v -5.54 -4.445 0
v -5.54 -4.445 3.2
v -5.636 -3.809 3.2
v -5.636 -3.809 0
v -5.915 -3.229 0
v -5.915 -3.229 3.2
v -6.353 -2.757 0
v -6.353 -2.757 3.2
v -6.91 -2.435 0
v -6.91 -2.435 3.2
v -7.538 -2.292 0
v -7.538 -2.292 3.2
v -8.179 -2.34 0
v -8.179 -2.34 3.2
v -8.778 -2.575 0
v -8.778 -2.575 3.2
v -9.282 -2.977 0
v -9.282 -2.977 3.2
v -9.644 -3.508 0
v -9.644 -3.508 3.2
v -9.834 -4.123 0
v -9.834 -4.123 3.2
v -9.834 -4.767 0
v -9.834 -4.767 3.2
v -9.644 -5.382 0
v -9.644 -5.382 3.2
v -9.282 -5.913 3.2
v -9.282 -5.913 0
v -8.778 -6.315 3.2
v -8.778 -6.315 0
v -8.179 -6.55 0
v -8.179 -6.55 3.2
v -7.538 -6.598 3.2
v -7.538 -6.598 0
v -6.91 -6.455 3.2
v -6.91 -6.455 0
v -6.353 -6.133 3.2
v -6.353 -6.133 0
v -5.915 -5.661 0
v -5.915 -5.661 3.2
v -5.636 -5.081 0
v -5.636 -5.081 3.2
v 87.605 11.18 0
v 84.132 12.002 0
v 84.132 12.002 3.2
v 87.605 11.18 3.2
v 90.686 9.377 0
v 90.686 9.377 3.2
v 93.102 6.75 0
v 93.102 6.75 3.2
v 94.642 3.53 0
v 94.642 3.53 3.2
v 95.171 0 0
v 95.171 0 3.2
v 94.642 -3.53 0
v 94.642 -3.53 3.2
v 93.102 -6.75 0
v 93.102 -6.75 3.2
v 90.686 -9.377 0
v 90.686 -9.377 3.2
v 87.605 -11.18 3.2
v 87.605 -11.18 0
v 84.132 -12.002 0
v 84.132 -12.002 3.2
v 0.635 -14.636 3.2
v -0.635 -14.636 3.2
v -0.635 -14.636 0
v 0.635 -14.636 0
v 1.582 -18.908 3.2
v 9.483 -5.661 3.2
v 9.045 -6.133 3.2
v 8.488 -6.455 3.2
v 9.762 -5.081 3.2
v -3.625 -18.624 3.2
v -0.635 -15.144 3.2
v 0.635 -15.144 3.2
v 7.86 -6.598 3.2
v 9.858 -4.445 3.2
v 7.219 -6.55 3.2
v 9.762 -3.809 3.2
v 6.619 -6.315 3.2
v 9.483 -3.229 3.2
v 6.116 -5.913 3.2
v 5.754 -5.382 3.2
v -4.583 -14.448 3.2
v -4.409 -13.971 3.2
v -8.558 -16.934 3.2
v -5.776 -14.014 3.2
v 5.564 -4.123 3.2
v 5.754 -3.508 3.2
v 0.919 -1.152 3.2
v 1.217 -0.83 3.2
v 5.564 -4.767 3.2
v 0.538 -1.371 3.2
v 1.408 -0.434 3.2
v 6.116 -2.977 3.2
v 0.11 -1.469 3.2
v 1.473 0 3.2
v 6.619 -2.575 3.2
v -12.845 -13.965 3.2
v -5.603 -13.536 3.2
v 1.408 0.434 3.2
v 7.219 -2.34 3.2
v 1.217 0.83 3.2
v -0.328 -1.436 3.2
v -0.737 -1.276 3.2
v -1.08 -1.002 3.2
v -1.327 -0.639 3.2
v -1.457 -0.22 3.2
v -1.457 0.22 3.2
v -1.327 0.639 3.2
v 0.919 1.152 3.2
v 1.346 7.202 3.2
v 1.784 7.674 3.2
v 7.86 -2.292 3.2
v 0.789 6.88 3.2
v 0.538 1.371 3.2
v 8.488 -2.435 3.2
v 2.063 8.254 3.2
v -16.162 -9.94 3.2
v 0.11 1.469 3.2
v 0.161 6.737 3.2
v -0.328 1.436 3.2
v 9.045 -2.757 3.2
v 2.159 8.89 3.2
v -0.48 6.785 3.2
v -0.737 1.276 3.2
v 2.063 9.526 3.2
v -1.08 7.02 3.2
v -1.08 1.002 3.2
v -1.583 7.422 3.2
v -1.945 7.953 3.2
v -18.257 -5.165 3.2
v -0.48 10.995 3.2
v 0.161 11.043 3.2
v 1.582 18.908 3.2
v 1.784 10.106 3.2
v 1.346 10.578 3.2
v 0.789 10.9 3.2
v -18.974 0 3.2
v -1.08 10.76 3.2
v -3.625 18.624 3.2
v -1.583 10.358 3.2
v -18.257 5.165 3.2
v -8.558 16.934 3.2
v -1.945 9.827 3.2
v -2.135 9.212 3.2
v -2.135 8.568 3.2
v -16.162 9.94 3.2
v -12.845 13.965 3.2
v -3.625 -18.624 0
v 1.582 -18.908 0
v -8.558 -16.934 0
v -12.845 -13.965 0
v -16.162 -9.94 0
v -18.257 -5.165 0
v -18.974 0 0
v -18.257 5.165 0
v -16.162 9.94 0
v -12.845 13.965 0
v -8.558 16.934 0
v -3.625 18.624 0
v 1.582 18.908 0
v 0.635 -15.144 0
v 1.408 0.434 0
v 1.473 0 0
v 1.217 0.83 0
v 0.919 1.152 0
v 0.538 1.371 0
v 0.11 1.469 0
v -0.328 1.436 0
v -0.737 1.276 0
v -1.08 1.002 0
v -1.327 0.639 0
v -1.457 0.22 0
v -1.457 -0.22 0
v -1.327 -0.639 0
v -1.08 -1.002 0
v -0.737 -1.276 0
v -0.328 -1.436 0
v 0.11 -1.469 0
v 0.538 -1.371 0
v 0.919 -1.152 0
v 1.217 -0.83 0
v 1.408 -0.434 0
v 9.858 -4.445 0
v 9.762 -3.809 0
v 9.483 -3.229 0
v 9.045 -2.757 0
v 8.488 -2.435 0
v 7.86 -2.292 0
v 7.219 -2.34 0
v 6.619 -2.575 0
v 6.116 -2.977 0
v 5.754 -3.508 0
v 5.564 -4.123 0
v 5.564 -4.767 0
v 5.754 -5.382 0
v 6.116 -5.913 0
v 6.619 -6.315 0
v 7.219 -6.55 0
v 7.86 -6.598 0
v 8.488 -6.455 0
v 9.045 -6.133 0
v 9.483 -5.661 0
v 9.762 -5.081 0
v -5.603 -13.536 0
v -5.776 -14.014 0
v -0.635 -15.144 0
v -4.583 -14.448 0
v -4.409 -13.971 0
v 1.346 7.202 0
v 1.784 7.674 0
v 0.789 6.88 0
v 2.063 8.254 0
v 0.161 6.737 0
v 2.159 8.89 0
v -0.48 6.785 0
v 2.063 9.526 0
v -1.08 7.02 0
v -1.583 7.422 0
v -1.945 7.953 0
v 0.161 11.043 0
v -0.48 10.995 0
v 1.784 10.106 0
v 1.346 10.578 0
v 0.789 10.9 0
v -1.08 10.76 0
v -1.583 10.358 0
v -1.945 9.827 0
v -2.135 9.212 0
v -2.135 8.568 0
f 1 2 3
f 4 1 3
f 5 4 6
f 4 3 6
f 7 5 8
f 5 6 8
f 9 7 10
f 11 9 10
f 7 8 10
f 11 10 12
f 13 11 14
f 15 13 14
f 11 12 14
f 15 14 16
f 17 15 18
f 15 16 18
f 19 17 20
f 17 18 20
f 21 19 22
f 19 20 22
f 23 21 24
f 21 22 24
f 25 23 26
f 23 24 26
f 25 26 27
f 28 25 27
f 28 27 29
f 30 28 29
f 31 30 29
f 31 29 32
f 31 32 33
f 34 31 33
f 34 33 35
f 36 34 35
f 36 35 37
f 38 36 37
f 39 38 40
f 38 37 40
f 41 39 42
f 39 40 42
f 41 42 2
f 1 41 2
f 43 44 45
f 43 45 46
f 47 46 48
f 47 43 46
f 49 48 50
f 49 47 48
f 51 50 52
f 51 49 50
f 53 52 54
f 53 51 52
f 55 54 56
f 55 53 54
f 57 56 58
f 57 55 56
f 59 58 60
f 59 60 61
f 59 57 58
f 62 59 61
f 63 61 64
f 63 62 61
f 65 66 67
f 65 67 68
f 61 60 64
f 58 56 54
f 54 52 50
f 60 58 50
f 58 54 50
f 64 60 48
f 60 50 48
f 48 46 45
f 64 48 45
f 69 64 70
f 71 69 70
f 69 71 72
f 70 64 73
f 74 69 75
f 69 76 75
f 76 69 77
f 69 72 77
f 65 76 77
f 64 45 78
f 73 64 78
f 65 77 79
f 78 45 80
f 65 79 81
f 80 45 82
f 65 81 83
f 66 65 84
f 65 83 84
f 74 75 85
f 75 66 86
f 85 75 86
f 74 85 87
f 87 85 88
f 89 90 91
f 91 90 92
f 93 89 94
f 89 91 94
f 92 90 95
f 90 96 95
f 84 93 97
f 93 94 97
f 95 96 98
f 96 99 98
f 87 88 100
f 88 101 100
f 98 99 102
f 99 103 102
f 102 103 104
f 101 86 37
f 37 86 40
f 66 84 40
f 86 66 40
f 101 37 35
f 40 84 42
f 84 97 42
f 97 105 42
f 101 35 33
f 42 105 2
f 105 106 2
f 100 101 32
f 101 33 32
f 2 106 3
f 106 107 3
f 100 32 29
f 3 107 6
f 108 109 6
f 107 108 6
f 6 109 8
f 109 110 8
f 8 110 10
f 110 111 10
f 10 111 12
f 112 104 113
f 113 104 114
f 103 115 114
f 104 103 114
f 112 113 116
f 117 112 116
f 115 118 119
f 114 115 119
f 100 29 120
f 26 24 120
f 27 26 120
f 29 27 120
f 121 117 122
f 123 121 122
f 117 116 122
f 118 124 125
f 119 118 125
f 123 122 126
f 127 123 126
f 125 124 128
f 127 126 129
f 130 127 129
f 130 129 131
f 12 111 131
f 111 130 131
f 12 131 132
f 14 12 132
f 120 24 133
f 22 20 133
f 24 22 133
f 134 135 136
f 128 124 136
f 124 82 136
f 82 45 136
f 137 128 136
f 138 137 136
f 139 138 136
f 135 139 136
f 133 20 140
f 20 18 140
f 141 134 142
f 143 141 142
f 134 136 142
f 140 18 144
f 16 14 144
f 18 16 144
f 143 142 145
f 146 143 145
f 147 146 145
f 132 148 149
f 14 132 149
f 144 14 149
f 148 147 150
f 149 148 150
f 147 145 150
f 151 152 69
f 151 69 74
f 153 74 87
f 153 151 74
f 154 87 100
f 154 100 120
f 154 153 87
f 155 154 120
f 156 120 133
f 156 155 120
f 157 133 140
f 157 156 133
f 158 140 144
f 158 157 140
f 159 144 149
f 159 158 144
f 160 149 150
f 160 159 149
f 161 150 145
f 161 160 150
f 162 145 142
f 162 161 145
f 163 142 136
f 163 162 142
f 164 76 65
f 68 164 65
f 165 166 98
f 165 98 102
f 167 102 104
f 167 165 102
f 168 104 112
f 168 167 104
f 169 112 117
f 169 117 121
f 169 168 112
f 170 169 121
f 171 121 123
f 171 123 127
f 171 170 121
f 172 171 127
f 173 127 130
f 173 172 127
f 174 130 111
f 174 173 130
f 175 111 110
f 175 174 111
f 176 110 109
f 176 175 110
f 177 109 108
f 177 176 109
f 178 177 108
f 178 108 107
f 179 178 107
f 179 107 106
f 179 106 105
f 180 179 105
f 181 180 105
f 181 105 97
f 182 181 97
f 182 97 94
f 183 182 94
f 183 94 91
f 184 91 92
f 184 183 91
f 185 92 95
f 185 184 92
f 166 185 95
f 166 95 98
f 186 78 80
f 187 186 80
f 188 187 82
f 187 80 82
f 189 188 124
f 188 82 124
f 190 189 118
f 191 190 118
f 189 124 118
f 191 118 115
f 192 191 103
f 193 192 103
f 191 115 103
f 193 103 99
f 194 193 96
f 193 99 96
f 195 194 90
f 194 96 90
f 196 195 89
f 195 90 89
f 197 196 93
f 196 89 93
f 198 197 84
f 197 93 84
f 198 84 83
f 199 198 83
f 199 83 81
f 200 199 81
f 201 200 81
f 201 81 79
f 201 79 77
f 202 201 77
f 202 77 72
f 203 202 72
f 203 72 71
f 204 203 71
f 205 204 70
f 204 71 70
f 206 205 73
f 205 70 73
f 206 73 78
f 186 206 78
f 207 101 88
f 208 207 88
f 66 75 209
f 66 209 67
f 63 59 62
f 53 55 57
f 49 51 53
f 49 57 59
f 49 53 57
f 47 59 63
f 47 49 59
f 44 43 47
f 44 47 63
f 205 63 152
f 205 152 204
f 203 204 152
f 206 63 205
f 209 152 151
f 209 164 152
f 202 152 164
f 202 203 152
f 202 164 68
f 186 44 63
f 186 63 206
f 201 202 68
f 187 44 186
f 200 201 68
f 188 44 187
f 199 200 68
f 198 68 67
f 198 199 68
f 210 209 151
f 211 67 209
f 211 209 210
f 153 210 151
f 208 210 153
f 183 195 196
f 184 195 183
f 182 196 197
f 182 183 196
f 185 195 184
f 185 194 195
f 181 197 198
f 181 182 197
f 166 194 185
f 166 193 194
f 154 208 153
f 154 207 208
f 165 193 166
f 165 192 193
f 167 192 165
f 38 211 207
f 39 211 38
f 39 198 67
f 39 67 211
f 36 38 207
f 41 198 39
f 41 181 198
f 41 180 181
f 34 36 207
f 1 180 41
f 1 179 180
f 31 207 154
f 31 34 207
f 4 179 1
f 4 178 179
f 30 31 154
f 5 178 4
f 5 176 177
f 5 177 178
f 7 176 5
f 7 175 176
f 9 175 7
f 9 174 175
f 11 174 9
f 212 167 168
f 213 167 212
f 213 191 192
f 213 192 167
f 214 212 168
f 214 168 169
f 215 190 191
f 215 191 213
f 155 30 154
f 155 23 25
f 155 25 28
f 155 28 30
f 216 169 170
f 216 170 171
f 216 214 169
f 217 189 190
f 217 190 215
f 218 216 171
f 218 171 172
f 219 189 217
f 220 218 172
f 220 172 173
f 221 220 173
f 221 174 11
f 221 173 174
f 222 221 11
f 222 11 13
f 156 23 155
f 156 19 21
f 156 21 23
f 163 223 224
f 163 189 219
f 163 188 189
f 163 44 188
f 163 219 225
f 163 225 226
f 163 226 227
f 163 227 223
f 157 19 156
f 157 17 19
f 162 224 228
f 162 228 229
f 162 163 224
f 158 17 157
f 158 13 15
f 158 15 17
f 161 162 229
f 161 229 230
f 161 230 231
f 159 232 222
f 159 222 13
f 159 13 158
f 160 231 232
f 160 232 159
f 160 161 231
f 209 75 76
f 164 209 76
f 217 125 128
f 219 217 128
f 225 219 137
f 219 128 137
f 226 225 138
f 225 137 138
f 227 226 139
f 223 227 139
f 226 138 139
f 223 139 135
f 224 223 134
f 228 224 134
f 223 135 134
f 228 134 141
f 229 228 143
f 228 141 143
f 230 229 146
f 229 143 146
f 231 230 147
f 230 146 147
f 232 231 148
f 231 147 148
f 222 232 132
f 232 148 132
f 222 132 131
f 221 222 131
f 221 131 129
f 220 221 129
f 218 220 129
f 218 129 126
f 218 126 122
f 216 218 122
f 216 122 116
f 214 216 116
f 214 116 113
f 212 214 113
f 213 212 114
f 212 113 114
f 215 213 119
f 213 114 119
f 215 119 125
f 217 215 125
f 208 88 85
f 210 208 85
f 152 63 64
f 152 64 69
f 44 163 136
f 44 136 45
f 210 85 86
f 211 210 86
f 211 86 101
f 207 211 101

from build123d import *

# Parameters (mm, degrees)
SKETCH1_R           = 1.4732
BOSS_EXTRUDE1_DEPTH = 3.2004
SKETCH2_W           = 1.27
SKETCH2_H           = 0.508
CUT_EXTRUDE1_DEPTH  = 3.2004
SKETCH3_R           = 2.159
CUT_EXTRUDE2_DEPTH  = 3.2004


with BuildPart() as part:
    # Sketch1 → Boss-Extrude1 (new body)
    with BuildSketch(Plane.XY):
        with BuildLine():
            Line((1.58185229, 18.90776), (84.13185229, 12.0015))
            ThreePointArc((84.13185229, 12.0015), (95.171215867, 0), (84.13185229, -12.0015))
            Line((84.13185229, -12.0015), (1.58185229, -18.90776))
            ThreePointArc((1.58185229, -18.90776), (-18.973814716, 0), (1.58185229, 18.90776))
        make_face()
        Circle(SKETCH1_R, mode=Mode.SUBTRACT)
    extrude(amount=BOSS_EXTRUDE1_DEPTH)

    # Sketch2 → Cut-Extrude1 (cut)
    with BuildSketch(Plane.XY.offset(3.2004)):
        Polygon((-4.582879775, -14.447974492), (-4.409133542, -13.970610641), (-5.602543171, -13.536245059), (-5.776289403, -14.01360891), align=None)
        with Locations((0, -14.890092213)):
            Rectangle(SKETCH2_W, SKETCH2_H)
    extrude(amount=-CUT_EXTRUDE1_DEPTH, mode=Mode.SUBTRACT)

    # Sketch3 → Cut-Extrude2 (cut)
    with BuildSketch(Plane.XY.offset(3.2004)):
        with Locations((0, 8.89)):
            Circle(SKETCH3_R)
        with Locations((7.69896584, -4.445)):
            Circle(SKETCH3_R)
        with Locations((-7.69896584, -4.445)):
            Circle(SKETCH3_R)
    extrude(amount=-CUT_EXTRUDE2_DEPTH, mode=Mode.SUBTRACT)


solid = part.part
